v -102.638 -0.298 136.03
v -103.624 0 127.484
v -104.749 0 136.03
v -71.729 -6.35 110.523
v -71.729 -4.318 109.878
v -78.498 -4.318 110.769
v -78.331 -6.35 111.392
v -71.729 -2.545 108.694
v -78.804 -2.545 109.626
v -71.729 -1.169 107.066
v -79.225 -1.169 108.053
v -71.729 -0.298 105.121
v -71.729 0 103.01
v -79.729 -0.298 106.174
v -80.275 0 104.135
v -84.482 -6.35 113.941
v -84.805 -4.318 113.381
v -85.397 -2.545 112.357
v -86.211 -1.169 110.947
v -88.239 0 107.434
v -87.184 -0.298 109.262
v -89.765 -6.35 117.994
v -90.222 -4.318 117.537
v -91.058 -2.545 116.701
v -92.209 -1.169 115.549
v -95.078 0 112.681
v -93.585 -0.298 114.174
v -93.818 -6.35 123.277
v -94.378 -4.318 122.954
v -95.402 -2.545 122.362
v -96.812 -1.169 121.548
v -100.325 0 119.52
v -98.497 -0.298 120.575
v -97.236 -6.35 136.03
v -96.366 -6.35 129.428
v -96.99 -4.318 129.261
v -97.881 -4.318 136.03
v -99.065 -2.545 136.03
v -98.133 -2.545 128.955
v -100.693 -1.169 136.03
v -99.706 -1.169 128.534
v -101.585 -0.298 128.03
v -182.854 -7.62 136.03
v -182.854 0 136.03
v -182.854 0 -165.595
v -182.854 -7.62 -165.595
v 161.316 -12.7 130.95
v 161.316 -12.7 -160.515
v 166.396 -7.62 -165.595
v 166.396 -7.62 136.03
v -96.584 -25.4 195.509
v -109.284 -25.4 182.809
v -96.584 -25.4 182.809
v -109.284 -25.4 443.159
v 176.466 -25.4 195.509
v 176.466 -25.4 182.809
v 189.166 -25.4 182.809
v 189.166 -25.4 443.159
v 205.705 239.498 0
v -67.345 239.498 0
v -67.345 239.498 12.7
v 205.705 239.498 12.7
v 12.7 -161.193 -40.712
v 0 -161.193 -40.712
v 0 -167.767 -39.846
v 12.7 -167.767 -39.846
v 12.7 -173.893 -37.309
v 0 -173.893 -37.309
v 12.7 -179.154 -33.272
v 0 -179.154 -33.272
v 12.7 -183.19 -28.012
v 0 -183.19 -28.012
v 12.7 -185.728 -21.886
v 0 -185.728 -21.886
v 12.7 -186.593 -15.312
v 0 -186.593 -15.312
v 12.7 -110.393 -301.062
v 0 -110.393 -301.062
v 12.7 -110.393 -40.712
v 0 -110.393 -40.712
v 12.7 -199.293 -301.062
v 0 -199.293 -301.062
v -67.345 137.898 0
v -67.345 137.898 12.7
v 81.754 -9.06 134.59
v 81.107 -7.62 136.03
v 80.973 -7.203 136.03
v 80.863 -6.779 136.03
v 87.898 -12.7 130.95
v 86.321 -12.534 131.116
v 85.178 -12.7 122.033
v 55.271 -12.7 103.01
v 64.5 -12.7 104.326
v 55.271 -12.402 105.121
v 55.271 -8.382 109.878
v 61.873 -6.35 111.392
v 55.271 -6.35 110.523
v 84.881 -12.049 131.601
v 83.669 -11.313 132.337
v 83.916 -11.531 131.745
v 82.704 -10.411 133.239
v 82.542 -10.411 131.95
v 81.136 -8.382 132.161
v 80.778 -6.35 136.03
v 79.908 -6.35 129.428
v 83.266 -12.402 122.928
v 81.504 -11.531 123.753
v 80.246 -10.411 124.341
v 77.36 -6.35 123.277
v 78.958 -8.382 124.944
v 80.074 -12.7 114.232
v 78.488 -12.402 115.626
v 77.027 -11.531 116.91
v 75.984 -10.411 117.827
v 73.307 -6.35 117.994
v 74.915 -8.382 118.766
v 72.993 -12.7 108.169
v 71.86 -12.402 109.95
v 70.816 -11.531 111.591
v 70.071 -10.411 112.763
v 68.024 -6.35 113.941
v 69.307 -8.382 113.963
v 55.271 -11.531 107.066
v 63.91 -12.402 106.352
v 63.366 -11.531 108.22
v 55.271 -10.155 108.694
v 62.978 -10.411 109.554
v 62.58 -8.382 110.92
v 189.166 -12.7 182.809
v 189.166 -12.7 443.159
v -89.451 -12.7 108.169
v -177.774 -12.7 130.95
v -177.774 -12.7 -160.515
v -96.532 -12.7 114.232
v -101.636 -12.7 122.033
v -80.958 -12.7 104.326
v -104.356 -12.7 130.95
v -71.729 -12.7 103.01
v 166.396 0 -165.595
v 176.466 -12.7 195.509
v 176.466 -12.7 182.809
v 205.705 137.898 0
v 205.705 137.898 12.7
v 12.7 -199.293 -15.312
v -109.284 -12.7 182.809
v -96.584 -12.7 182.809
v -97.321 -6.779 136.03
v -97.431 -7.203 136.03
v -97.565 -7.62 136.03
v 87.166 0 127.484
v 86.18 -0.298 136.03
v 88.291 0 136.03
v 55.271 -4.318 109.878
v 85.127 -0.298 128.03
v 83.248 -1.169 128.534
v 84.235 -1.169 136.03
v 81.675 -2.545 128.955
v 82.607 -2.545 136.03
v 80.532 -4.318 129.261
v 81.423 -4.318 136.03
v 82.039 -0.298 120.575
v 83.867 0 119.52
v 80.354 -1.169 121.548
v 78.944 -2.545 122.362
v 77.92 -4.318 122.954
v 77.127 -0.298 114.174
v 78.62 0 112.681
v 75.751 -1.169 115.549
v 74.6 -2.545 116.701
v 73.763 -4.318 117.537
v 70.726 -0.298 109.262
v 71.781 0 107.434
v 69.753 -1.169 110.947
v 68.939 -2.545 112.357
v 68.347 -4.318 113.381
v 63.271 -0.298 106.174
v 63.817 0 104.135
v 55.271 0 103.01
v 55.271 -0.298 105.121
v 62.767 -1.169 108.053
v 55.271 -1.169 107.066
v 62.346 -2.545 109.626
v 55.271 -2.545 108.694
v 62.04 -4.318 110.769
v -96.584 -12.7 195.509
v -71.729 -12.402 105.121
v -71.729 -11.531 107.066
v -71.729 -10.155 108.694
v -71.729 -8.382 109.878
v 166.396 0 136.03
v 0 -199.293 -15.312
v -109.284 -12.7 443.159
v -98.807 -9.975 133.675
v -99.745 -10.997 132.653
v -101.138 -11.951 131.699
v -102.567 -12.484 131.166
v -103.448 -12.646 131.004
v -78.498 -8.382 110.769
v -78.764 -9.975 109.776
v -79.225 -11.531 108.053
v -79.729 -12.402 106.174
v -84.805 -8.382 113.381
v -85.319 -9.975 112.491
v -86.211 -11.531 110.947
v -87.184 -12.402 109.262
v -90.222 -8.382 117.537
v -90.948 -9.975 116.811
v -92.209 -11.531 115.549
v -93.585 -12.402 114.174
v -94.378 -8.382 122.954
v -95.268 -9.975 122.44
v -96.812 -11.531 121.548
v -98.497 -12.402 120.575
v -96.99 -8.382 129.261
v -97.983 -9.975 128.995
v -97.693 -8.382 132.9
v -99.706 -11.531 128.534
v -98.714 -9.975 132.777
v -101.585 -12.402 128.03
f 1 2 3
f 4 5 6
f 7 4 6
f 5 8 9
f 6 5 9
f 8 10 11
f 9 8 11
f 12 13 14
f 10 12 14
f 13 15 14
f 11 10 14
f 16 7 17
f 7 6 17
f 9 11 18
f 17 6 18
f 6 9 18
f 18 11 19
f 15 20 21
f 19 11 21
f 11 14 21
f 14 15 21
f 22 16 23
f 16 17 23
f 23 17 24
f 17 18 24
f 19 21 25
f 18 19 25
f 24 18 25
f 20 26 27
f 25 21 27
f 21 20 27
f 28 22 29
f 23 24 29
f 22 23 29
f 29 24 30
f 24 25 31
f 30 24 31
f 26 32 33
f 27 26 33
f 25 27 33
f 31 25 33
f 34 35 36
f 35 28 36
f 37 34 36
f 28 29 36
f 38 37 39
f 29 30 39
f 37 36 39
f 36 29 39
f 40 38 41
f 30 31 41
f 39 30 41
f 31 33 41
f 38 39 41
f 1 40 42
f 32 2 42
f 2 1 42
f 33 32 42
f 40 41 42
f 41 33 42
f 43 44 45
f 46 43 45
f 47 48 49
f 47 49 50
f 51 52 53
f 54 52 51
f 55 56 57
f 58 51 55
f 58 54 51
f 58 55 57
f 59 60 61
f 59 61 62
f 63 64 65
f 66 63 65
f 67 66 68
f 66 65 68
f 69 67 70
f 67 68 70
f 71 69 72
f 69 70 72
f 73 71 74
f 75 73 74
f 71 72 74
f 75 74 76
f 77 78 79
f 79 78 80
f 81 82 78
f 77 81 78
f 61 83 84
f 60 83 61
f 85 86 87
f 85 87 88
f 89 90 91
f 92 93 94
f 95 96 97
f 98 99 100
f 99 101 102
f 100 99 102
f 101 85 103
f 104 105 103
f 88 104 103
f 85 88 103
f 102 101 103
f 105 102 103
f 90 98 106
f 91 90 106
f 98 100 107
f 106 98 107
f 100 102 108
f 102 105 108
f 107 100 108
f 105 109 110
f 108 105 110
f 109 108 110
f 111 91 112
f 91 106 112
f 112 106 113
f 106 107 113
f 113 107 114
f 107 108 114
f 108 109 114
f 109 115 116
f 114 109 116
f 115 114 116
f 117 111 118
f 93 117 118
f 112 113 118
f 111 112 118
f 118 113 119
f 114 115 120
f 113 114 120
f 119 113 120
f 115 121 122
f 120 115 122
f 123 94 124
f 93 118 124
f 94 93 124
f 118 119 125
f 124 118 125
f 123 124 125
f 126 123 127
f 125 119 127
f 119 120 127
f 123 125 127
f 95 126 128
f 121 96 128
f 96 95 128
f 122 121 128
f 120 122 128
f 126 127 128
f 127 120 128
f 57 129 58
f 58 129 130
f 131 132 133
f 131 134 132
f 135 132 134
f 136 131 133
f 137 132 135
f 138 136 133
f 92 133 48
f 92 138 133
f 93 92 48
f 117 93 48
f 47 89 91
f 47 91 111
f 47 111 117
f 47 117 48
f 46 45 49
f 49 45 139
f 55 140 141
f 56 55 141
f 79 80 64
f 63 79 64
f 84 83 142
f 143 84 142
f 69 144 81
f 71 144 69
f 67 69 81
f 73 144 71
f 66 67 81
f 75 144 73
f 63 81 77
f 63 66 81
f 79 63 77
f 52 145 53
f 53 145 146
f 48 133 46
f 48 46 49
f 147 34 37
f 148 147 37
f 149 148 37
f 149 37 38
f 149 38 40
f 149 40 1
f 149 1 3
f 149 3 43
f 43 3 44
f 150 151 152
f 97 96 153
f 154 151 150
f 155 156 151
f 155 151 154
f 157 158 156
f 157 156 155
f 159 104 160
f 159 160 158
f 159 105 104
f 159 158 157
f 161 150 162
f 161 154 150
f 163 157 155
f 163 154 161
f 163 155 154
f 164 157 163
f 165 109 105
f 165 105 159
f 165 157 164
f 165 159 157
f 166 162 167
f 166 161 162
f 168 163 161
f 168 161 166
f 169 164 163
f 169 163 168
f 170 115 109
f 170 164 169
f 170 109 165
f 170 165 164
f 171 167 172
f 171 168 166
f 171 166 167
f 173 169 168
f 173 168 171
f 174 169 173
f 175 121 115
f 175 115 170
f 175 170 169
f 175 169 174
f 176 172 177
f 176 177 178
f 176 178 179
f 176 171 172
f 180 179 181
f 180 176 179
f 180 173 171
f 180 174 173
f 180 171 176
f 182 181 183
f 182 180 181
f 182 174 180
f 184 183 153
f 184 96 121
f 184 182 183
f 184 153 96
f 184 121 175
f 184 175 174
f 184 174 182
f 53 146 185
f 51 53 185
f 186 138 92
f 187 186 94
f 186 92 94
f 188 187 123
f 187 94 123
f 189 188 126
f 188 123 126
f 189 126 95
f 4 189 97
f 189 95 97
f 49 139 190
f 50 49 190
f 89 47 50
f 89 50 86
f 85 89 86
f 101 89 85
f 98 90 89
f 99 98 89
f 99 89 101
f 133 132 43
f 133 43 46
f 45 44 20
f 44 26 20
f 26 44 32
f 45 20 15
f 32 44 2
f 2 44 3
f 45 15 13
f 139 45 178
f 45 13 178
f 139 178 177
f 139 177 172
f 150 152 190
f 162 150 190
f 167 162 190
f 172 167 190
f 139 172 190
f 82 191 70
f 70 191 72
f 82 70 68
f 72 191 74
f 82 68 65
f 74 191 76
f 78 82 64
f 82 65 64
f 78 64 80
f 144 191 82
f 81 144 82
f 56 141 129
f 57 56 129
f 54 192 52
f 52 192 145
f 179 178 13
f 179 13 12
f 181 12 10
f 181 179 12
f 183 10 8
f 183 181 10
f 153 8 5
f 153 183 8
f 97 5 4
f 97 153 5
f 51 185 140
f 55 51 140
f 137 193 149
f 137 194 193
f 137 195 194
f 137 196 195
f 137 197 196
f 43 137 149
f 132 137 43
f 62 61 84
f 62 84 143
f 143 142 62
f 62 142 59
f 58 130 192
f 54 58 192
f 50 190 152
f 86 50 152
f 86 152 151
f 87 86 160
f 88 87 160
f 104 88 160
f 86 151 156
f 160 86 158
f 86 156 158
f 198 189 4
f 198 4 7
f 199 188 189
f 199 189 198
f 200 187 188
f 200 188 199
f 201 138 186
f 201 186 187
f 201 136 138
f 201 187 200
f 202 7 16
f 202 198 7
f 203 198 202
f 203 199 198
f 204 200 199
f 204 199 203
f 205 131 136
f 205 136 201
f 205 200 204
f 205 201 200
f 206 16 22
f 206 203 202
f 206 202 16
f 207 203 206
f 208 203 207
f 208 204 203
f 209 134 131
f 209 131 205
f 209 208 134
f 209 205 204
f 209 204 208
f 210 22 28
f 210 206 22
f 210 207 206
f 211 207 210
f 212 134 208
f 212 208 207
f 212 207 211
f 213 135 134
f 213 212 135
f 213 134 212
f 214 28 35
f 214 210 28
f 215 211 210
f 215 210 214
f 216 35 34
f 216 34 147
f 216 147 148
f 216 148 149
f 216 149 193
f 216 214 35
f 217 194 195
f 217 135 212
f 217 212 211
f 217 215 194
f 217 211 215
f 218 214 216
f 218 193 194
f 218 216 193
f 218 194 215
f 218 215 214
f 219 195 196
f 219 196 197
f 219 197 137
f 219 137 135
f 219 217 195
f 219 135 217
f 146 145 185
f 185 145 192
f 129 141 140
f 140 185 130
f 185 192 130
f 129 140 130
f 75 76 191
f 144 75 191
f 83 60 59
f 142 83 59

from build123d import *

# Parameters (mm, degrees)
F1_DEPTH     = 12.7
F2_SIZE      = 5.08
F3_T3_DEPTH  = 127
F3_T6_DEPTH  = 127
F3_T9_ANGLE  = 132.9890967712
F3_T12_ANGLE = 132.9890967712
F3_T15_ANGLE = 121.447994897
F3_T18_ANGLE = 121.447994897
F4_W         = 273.05
F4_H         = 101.6
F5_DEPTH     = 12.7
F7_DEPTH     = 12.7
F9_DEPTH     = 12.7


# Not quite as in the source:
# - a fillet or chamfer that OpenCascade refuses, or shapes differently, is made with other operations: its cross-section is extruded or revolved along the edge and cut away or added


with BuildPart() as f1:
    # F0 (on Front) → F1 (new body)
    with BuildSketch(Plane.XZ):
        with BuildLine():
            Line((-97.1290172577, 136.0299303359), (-182.8540172577, 136.0299303359))
            Line((-182.8540172577, 136.0299303359), (-182.8540172577, -165.5950696641))
            Line((-182.8540172577, -165.5950696641), (166.3959827423, -165.5950696641))
            Line((166.3959827423, -165.5950696641), (166.3959827423, 136.0299303359))
            Line((166.3959827423, 136.0299303359), (80.6709827423, 136.0299303359))
            ThreePointArc((80.6709827423, 136.0299303359), (73.2314949844, 118.0694180937), (55.2709827423, 110.6299303359))
            Line((55.2709827423, 110.6299303359), (-71.7290172577, 110.6299303359))
            ThreePointArc((-71.7290172577, 110.6299303359), (-89.6895294998, 118.0694180937), (-97.1290172577, 136.0299303359))
        make_face()
    extrude(amount=F1_DEPTH)

    # F2
    f2_edges = [f1.edges().sort_by_distance(p)[0] for p in [
        (-8.229017, -12.7, -165.59507),
        (166.395983, -12.7, -14.78257),
        (-182.854017, -12.7, -14.78257),
        (-139.991517, -12.7, 136.02993),
        (123.533483, -12.7, 136.02993),
    ]]
    chamfer(f2_edges, length=F2_SIZE)

    # F3: fillet of radius 7.62 on 2 edges, made by hand


with BuildPart() as f3_tool1:
    # F3_s2 → F3_t3 (new body)
    with BuildSketch(Plane.YZ.offset(55.2709827423)):
        with BuildLine():
            ThreePointArc((-12.7, 103.0099303359), (-10.4681536726, 108.3980840085), (-5.08, 110.6299303359))
            Line((-5.08, 110.6299303359), (-12.7, 110.6299303359))
            Line((-12.7, 110.6299303359), (-12.7, 103.0099303359))
        make_face()
    extrude(amount=-F3_T3_DEPTH)


with BuildPart() as f3_tool4:
    # F3_s5 → F3_t6 (new body)
    with BuildSketch(Plane.YZ.offset(55.2709827423)):
        with BuildLine():
            ThreePointArc((0, 103.0099303359), (-2.2318463274, 108.3980840085), (-7.62, 110.6299303359))
            Line((-7.62, 110.6299303359), (0, 110.6299303359))
            Line((0, 110.6299303359), (0, 103.0099303359))
        make_face()
    extrude(amount=-F3_T6_DEPTH)


with BuildPart() as f3_tool7:
    # F3_s8 → F3_t9 (revolve)
    with BuildSketch(Plane(origin=(-42.1502287044, 0, 45.217835005), x_dir=(0, 1, 0), z_dir=(-0.6818591731, 0, 0.7314834708))):
        with BuildLine():
            ThreePointArc((0, -166.2030661087), (-2.2318463274, -160.8149124361), (-7.62, -158.5830661087))
            Line((-7.62, -158.5830661087), (0, -158.5830661087))
            Line((0, -158.5830661087), (0, -166.2030661087))
        make_face()
    revolve(axis=Axis((55.2709827423, 0, 136.0299303359), (0, 1, 0)), revolution_arc=F3_T9_ANGLE)


with BuildPart() as f3_tool10:
    # F3_s11 → F3_t12 (revolve)
    with BuildSketch(Plane.YZ.offset(-71.7290172577)):
        with BuildLine():
            ThreePointArc((-7.62, 110.6299303359), (-2.2318463274, 108.3980840085), (0, 103.0099303359))
            Line((0, 103.0099303359), (0, 110.6299303359))
            Line((0, 110.6299303359), (-7.62, 110.6299303359))
        make_face()
    revolve(axis=Axis((-71.7290172577, 0, 136.0299303359), (0, 1, 0)), revolution_arc=F3_T12_ANGLE)


with BuildPart() as f3_tool13:
    # F3_s14 → F3_t15 (revolve)
    with BuildSketch(Plane(origin=(-45.5010619878, 0, 74.4024868236), x_dir=(0, 1, 0), z_dir=(-0.521724442, 0, 0.8531140643))):
        with BuildLine():
            ThreePointArc((-12.7, -151.1425922207), (-10.4681536726, -145.7544385481), (-5.08, -143.5225922207))
            Line((-5.08, -143.5225922207), (-12.7, -143.5225922207))
            Line((-12.7, -143.5225922207), (-12.7, -151.1425922207))
        make_face()
    revolve(axis=Axis((55.2709827423, -12.7, 136.0299303359), (0, 1, 0)), revolution_arc=F3_T15_ANGLE)


with BuildPart() as f3_tool16:
    # F3_s17 → F3_t18 (revolve)
    with BuildSketch(Plane.YZ.offset(-71.7290172577)):
        with BuildLine():
            ThreePointArc((-5.08, 110.6299303359), (-10.4681536726, 108.3980840085), (-12.7, 103.0099303359))
            Line((-12.7, 103.0099303359), (-12.7, 110.6299303359))
            Line((-12.7, 110.6299303359), (-5.08, 110.6299303359))
        make_face()
    revolve(axis=Axis((-71.7290172577, -12.7, 136.0299303359), (0, 1, 0)), revolution_arc=F3_T18_ANGLE)


with BuildPart() as f1_1:
    add(f1.part)

    # F3_t19: cut F3_tool1, F3_tool4, F3_tool7, F3_tool10, F3_tool13, F3_tool16
    add([f3_tool1.part, f3_tool4.part, f3_tool7.part, f3_tool10.part, f3_tool13.part, f3_tool16.part], mode=Mode.SUBTRACT)


with BuildPart() as f5:
    # F4 (on Top) → F5 (new body)
    with BuildSketch(Plane.XY):
        with Locations((69.1801686266, 188.6979788542)):
            Rectangle(F4_W, F4_H)
    extrude(amount=F5_DEPTH)


with BuildPart() as f7:
    # F6 (on Right) → F7 (new body)
    with BuildSketch(Plane.YZ):
        with BuildLine():
            ThreePointArc((-161.1934086972, -40.7115346551), (-179.1539209393, -33.2720468972), (-186.5934086972, -15.3115346551))
            Line((-186.5934086972, -15.3115346551), (-199.2934086972, -15.3115346551))
            Line((-199.2934086972, -15.3115346551), (-199.2934086972, -301.0615346551))
            Line((-199.2934086972, -301.0615346551), (-110.3934086972, -301.0615346551))
            Line((-110.3934086972, -301.0615346551), (-110.3934086972, -40.7115346551))
            Line((-110.3934086972, -40.7115346551), (-161.1934086972, -40.7115346551))
        make_face()
    extrude(amount=F7_DEPTH)


with BuildPart() as f9:
    # F8 (on face) → F9 (new body)
    with BuildSketch(Plane.XZ.offset(12.7)):
        Polygon((189.165537107, 443.1593230724), (-109.284462893, 443.1593230724), (-109.284462893, 195.5093230724), (-109.284462893, 182.8093230724), (-96.584462893, 182.8093230724), (-96.584462893, 195.5093230724), (176.465537107, 195.5093230724), (176.465537107, 182.8093230724), (189.165537107, 182.8093230724), (189.165537107, 195.5093230724), align=None)
    extrude(amount=F9_DEPTH)


solid = Compound([f1_1.part, f5.part, f7.part, f9.part])
